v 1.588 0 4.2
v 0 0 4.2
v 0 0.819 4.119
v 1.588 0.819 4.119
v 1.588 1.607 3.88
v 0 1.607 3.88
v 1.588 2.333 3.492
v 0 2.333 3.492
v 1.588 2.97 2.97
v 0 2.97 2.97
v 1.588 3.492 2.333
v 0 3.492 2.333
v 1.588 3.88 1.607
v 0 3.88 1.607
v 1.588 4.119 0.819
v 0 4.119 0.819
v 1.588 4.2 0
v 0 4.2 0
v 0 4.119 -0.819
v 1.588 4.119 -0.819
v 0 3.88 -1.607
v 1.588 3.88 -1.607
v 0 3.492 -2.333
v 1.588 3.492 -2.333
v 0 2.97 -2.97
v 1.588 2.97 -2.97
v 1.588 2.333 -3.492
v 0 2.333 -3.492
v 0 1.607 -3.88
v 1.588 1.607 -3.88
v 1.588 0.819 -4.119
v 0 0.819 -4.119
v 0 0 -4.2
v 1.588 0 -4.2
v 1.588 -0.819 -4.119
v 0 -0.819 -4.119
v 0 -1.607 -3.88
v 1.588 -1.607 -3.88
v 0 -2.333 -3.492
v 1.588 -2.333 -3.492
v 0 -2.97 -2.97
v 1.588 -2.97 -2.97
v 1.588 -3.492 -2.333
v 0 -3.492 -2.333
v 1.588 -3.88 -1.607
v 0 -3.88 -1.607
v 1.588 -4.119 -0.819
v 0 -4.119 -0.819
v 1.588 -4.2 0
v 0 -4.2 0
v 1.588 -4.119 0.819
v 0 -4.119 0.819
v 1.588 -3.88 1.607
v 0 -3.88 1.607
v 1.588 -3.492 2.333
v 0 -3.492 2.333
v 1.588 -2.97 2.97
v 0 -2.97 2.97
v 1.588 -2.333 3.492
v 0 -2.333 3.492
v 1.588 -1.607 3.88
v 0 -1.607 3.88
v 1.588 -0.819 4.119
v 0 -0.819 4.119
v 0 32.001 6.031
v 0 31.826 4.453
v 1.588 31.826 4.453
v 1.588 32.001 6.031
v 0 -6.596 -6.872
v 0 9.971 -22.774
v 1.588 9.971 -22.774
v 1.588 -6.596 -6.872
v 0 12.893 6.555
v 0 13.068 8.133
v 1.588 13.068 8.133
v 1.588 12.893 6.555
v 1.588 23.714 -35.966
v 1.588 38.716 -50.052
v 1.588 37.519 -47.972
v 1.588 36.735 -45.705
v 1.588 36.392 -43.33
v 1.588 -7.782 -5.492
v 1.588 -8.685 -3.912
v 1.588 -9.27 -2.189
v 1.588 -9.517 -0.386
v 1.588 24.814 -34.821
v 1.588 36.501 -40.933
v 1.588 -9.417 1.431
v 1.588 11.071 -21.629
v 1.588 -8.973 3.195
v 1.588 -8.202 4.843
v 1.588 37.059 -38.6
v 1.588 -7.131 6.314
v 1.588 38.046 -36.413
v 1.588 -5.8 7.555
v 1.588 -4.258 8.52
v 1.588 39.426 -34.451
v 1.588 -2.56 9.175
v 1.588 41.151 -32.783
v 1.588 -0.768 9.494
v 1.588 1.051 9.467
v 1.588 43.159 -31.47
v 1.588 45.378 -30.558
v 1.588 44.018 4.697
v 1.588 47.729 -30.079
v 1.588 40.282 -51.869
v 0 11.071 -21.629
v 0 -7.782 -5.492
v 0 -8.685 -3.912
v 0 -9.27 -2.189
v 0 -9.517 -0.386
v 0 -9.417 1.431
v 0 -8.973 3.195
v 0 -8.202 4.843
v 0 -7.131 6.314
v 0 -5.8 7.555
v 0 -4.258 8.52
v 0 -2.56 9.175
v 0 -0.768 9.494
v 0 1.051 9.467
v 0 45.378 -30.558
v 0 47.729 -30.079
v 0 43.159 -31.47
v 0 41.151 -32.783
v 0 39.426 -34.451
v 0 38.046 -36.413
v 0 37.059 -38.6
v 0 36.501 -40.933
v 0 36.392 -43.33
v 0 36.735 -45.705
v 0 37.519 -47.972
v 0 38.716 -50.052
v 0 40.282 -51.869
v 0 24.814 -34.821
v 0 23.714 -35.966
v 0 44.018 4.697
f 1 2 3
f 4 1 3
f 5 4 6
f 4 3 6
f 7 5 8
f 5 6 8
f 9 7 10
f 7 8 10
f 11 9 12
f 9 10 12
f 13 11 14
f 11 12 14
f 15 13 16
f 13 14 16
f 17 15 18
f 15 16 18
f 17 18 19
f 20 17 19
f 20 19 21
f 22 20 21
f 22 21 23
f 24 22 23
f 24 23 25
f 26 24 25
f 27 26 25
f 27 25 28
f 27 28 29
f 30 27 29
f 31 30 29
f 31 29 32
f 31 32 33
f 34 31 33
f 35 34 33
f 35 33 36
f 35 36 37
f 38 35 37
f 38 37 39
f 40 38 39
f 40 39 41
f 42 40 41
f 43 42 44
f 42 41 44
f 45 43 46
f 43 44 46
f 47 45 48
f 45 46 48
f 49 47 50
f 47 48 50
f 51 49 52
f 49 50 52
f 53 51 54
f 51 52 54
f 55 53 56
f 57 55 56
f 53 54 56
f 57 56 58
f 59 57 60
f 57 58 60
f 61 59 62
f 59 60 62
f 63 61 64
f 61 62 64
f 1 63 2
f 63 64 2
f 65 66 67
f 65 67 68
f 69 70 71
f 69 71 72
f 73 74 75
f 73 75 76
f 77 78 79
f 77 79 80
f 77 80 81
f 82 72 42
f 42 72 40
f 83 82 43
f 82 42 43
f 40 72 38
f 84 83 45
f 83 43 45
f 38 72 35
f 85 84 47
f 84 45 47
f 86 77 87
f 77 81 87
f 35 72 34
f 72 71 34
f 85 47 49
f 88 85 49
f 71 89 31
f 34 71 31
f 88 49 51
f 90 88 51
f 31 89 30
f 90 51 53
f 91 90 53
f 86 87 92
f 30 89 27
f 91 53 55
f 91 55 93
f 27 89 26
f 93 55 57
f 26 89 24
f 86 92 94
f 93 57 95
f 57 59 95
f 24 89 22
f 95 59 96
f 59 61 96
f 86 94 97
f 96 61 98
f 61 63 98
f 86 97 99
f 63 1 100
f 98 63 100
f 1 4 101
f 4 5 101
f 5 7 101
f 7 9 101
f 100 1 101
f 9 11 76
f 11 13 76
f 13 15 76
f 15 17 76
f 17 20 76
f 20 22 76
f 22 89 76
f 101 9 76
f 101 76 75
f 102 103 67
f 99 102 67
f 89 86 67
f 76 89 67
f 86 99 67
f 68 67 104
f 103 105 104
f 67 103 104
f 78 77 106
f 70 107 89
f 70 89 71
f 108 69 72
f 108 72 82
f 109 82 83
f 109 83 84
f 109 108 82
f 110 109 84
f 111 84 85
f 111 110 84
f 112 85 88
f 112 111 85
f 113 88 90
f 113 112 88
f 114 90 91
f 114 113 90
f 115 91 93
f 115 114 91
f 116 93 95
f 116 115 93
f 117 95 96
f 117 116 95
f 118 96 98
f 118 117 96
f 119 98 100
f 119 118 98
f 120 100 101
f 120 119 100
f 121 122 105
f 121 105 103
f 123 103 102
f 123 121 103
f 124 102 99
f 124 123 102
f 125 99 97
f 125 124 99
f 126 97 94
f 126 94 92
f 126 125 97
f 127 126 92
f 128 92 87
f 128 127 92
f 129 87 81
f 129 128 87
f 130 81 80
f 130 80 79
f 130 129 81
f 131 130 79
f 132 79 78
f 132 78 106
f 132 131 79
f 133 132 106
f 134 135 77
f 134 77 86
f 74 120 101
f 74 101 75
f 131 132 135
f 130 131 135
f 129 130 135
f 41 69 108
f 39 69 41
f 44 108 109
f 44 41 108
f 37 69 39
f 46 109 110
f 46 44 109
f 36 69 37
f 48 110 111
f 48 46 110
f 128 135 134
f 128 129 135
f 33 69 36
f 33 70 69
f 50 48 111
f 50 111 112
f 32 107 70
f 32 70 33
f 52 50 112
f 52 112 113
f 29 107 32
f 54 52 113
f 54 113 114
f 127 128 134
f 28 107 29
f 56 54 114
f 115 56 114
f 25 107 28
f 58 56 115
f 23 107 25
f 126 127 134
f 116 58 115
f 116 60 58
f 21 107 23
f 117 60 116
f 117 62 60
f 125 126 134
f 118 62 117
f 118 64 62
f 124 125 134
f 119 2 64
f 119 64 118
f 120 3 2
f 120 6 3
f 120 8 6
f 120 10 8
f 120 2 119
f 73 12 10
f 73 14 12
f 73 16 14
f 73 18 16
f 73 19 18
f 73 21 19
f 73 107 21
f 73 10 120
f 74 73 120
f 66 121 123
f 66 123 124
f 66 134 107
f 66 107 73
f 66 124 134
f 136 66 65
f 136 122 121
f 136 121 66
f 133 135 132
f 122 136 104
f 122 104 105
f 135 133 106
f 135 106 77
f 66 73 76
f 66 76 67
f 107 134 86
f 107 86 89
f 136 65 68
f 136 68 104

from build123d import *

# Parameters (mm, degrees)
BOSS_EXTRUDE1_DEPTH  = 1.5875
M8_CLEARANCE_HOLE1_D = 8.4


with BuildPart() as part:
    # Sketch1 → Boss-Extrude1 (new body)
    with BuildSketch(Plane(origin=(0, 0, 0), x_dir=(0, 0, -1), z_dir=(1, 0, 0))):
        with BuildLine():
            Line((-9.466844547, 1.05094211), (-8.132830894, 13.067683806))
            Line((-8.132830894, 13.067683806), (-6.55502347, 12.892526787))
            Line((-6.55502347, 12.892526787), (-4.453139249, 31.826215882))
            Line((-4.453139249, 31.826215882), (-6.030946674, 32.0013729))
            Line((-6.030946674, 32.0013729), (-4.696933021, 44.018114595))
            Line((-4.696933021, 44.018114595), (30.078862848, 47.728850174))
            ThreePointArc((30.078862848, 47.728850174), (38.60002065, 37.058807525), (51.869269545, 40.281690423))
            Line((51.869269545, 40.281690423), (35.966414021, 23.714419941))
            Line((35.966414021, 23.714419941), (34.821152107, 24.813752193))
            Line((34.821152107, 24.813752193), (21.629165093, 11.070609225))
            Line((21.629165093, 11.070609225), (22.774427007, 9.971276974))
            Line((22.774427007, 9.971276974), (6.871571484, -6.595993507))
            ThreePointArc((6.871571484, -6.595993507), (-4.037668467, -8.626868397), (-9.466844547, 1.05094211))
        make_face()
    extrude(amount=BOSS_EXTRUDE1_DEPTH)

    # M8 Clearance Hole1 (through all)
    with Locations(Plane(origin=(1.5875, 0, 0), x_dir=(0, 0, -1), z_dir=(1, 0, 0))):
        with Locations((0, 0)):
            Hole(M8_CLEARANCE_HOLE1_D / 2)


solid = part.part
